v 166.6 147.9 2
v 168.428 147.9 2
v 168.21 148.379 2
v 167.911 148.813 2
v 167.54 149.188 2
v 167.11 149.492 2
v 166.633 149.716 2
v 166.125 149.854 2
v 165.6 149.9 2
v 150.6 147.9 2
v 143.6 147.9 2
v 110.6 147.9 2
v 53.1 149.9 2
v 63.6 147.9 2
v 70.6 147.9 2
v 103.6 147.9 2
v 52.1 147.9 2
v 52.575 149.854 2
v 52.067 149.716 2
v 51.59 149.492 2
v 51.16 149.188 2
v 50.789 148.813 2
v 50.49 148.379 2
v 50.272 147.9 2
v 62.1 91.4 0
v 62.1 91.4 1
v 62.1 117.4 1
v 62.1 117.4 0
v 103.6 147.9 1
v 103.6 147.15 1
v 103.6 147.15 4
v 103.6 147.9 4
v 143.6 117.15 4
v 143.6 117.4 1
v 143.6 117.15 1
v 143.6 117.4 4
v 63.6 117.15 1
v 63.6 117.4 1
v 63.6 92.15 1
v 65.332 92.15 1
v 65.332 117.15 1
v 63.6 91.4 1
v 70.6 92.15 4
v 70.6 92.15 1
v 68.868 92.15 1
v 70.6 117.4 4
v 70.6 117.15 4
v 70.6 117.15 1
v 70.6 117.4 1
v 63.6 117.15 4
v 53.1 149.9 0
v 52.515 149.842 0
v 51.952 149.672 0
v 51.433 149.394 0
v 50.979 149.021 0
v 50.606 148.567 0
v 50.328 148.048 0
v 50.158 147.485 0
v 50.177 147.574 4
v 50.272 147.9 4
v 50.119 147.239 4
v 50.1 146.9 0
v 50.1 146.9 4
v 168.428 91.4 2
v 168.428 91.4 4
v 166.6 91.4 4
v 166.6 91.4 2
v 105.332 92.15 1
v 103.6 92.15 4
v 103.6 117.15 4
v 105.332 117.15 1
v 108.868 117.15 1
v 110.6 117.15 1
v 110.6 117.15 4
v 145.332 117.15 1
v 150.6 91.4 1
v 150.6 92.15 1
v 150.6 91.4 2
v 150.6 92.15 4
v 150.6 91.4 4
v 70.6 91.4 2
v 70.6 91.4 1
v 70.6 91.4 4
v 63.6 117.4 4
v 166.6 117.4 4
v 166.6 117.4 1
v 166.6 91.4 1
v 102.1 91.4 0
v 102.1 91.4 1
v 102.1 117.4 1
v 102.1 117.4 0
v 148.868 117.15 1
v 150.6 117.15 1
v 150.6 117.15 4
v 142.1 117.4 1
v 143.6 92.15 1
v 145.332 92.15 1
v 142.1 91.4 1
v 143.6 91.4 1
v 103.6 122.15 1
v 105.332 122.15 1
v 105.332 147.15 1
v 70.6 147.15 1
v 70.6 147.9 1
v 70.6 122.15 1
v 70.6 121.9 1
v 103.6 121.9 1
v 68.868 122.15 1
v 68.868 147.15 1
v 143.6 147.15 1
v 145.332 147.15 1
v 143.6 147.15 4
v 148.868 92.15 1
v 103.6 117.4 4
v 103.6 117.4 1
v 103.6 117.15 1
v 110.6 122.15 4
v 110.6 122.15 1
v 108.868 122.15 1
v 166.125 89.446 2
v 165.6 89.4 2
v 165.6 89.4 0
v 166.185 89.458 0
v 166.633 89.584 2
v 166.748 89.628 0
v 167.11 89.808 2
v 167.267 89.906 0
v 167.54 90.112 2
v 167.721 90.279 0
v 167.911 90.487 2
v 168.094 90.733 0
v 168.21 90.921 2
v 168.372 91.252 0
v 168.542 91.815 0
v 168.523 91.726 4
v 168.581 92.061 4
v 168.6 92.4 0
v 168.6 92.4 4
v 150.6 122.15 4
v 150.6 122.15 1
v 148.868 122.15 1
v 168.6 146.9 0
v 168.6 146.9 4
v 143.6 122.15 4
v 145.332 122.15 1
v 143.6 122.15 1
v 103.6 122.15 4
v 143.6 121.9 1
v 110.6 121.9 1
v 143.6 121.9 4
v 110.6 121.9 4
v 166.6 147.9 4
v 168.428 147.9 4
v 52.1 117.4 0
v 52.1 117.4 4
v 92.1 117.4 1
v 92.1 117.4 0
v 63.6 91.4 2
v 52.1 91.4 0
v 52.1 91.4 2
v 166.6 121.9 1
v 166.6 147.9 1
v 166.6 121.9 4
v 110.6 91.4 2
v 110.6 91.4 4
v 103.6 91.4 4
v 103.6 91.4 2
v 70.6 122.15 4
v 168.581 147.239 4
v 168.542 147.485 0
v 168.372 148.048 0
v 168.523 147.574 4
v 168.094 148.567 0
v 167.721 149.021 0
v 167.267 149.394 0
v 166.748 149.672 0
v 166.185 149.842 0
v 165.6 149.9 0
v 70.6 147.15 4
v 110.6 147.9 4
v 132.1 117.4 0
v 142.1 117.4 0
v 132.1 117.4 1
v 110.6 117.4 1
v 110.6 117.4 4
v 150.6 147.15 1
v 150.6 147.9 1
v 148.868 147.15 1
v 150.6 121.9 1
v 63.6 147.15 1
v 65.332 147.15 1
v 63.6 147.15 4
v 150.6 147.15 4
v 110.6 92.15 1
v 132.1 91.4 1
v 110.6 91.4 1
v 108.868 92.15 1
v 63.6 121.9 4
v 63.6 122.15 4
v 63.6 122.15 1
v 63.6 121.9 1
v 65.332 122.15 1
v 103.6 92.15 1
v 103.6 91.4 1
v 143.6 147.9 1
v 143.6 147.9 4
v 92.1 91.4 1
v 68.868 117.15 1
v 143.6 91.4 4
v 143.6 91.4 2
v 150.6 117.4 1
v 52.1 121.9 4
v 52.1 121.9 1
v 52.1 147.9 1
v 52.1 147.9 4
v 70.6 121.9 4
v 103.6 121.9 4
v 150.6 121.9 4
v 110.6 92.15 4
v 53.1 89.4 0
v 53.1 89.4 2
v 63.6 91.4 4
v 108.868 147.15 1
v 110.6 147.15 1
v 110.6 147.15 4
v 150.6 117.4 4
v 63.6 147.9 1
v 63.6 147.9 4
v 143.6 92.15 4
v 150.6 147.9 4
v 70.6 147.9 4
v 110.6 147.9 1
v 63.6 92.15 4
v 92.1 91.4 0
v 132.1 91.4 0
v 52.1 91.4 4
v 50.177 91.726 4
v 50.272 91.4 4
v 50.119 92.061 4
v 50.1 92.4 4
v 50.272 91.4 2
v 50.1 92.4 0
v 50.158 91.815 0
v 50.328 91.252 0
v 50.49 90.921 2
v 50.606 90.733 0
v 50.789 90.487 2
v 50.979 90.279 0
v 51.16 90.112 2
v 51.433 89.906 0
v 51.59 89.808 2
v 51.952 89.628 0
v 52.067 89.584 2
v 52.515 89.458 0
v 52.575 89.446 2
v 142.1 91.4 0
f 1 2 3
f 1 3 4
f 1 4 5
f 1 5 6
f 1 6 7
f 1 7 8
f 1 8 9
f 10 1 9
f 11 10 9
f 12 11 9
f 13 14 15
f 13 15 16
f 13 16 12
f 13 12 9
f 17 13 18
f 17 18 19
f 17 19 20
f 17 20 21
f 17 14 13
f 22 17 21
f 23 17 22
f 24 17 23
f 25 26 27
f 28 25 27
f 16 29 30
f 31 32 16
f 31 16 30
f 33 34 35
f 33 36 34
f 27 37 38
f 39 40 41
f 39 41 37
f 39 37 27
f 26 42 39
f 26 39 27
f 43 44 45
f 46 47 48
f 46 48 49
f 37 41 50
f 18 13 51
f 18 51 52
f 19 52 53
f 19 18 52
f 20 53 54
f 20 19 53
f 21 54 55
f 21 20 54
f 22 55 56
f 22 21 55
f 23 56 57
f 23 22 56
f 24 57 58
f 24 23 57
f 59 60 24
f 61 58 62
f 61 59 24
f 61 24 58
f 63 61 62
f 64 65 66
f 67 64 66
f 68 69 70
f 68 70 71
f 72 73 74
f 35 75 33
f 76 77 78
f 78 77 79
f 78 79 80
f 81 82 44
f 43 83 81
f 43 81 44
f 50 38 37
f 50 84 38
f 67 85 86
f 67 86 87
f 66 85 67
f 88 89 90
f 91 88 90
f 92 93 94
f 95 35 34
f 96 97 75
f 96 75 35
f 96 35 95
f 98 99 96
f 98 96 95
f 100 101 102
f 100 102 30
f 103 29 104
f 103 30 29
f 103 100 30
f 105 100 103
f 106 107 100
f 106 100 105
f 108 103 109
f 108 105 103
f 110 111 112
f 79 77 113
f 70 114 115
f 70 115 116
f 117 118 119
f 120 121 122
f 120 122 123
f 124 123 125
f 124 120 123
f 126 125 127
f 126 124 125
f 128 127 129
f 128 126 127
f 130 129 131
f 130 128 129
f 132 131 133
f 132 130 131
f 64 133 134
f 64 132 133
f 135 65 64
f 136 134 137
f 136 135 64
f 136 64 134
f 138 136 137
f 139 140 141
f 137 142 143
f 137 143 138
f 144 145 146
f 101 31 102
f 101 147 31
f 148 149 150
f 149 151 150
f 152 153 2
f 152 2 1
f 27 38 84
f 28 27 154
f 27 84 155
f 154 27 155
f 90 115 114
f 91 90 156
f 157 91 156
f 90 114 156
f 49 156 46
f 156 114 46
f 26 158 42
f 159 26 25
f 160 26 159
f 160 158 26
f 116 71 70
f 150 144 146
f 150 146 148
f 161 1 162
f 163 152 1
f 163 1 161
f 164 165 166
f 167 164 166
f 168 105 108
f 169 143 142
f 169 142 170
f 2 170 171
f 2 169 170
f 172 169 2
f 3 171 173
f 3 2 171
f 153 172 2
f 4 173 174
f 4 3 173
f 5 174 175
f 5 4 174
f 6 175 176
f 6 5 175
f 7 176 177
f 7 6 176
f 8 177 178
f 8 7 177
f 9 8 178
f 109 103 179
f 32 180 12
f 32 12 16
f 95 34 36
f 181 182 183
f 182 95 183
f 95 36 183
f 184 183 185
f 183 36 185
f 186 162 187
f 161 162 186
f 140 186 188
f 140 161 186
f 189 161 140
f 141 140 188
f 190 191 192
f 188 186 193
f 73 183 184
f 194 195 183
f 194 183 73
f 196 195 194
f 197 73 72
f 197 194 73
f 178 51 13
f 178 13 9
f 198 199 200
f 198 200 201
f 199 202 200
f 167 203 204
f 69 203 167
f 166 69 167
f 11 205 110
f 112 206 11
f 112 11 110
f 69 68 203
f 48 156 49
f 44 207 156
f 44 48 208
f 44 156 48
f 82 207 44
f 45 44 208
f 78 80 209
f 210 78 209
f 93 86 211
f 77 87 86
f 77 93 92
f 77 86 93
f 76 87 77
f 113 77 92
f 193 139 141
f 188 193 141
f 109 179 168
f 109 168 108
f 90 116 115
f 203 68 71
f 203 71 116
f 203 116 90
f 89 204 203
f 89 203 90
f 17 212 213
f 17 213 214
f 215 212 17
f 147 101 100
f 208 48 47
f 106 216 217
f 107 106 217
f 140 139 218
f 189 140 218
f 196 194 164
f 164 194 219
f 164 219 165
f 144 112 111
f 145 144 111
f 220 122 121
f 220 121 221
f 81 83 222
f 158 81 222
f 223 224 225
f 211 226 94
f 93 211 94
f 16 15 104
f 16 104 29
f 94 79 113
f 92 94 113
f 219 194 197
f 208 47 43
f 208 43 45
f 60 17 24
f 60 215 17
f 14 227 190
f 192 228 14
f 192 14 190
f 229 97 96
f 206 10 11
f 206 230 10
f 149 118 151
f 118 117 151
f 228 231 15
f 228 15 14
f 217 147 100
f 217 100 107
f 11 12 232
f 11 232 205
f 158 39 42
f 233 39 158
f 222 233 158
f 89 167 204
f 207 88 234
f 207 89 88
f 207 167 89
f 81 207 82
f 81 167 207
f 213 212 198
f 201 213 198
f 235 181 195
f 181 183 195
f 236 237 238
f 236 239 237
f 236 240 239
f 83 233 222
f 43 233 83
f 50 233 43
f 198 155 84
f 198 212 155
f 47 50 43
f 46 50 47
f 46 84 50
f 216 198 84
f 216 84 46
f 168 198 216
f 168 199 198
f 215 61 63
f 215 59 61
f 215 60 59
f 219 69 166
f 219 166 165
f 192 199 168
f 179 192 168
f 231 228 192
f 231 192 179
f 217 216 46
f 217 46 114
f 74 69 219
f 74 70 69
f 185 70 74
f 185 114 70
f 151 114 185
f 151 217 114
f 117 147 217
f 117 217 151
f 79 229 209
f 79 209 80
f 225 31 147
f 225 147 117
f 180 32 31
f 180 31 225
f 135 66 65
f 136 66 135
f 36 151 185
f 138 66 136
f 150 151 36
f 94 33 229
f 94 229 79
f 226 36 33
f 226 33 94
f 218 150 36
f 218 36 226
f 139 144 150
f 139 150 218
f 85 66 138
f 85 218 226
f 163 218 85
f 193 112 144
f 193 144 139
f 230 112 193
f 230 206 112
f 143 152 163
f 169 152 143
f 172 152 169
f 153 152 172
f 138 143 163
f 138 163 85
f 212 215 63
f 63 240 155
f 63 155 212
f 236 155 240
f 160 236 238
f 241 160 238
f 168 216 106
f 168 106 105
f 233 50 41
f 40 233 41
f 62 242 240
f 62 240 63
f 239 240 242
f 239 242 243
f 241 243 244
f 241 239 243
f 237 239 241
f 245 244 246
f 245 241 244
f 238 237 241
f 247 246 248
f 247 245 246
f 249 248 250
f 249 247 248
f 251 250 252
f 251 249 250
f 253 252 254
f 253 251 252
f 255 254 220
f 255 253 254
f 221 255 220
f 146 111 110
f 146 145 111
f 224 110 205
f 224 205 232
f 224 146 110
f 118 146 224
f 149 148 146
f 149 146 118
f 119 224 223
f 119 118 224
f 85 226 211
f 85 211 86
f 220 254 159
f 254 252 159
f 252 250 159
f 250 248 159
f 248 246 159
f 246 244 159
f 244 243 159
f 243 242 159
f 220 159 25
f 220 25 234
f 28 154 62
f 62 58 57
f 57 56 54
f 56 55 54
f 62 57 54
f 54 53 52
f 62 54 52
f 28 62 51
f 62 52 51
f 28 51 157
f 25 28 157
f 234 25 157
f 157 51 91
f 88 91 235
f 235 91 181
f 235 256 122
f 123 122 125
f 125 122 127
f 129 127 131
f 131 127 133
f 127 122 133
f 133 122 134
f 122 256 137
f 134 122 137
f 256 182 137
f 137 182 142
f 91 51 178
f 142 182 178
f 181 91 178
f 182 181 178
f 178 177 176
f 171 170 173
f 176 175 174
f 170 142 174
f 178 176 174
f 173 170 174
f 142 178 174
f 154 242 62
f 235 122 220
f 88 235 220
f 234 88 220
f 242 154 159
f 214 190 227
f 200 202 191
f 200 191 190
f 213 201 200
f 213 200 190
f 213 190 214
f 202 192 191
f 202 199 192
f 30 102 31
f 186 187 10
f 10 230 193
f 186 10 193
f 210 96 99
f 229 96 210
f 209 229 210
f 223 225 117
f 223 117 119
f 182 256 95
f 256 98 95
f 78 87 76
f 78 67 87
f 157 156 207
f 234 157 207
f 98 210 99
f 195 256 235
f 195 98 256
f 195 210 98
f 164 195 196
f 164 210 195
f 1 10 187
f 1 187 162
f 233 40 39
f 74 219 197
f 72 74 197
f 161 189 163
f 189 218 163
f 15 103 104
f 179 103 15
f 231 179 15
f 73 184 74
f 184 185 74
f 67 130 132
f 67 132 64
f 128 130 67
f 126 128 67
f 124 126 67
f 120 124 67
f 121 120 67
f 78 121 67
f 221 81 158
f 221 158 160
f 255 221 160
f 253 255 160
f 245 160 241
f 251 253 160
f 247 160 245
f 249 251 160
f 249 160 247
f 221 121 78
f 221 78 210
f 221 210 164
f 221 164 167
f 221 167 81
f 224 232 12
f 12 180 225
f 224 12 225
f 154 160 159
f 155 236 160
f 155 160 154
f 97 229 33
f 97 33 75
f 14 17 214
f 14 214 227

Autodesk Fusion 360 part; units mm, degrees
sketch "Schizzo1" plane through (0, 0, 0) normal (0, 0, 1) x (1, 0, 0)
  line L0 (50, 150) -> (168.7, 150) construction
  line L1 (168.7, 150) -> (168.7, 89.3) construction
  line L2 (168.7, 89.3) -> (50, 89.3) construction
  line L3 (50, 89.3) -> (50, 150) construction
  line L4 (50, 119.65) -> (168.7, 119.65) construction
  line L5 (109.35, 150) -> (109.35, 89.3) construction
  line L6 (168.6, 89.4) -> (50.1, 89.4)
  line L7 (50.1, 89.4) -> (50.1, 149.9)
  line L8 (50.1, 149.9) -> (168.6, 149.9)
  line L9 (168.6, 149.9) -> (168.6, 89.4)
  line L10 (168.6, 89.4) -> (50.1, 149.9) construction
  line L11 (50.1, 89.4) -> (168.6, 149.9) construction
  point P0 (109.35, 119.65)
  dimension "d1" = 118.7
  dimension "d2" = 60.7
  dimension "d3" = 0.1
  dimension "d4" = 0.1
extrude "Estrusione1" add sketch "Schizzo1" along normal blind 4
fillet "Raccordo1" radius 3 4 edges at (50.1, 89.4, 2) (168.6, 89.4, 2) (50.1, 149.9, 2) (168.6, 149.9, 2)
sketch "Schizzo2" plane through (0, 0, 4) normal (0, 0, 1) x (-1, 0, 0)
  arc A0 (-168.6, -146.9) -> (-165.6, -149.9) centre (-165.6, -146.9) ccw
  line L0 (-165.6, -149.9) -> (-53.1, -149.9)
  arc A1 (-53.1, -149.9) -> (-50.1, -146.9) centre (-53.1, -146.9) ccw
  line L1 (-50.1, -146.9) -> (-50.1, -92.4)
  arc A2 (-50.1, -92.4) -> (-53.1, -89.4) centre (-53.1, -92.4) ccw
  line L2 (-53.1, -89.4) -> (-165.6, -89.4)
  arc A3 (-165.6, -89.4) -> (-168.6, -92.4) centre (-165.6, -92.4) ccw
  line L3 (-168.6, -92.4) -> (-168.6, -146.9)
  line L4 (-50.1, -149.9) -> (-168.6, -149.9) construction
  line L5 (-168.6, -149.9) -> (-168.6, -89.4) construction
  line L6 (-168.6, -89.4) -> (-50.1, -89.4) construction
  line L7 (-50.1, -89.4) -> (-50.1, -149.9) construction
  line L8 (-50.1, -119.65) -> (-168.6, -119.65) construction
  line L9 (-109.35, -149.9) -> (-109.35, -89.4) construction
  line L10 (-166.6, -91.4) -> (-52.1, -91.4)
  line L11 (-52.1, -91.4) -> (-52.1, -147.9)
  line L12 (-52.1, -147.9) -> (-166.6, -147.9)
  line L13 (-166.6, -147.9) -> (-166.6, -91.4)
  line L14 (-166.6, -91.4) -> (-52.1, -147.9) construction
  line L15 (-52.1, -91.4) -> (-166.6, -147.9) construction
  line L16 (-70.6, -91.4) -> (-70.6, -147.9)
  line L17 (-63.6, -147.9) -> (-63.6, -91.4)
  line L18 (-52.1, -121.9) -> (-52.1, -147.9)
  line L19 (-103.6, -147.9) -> (-103.6, -91.4)
  line L20 (-110.6, -147.9) -> (-110.6, -91.4)
  line L21 (-143.6, -147.9) -> (-143.6, -91.4)
  line L22 (-150.6, -147.9) -> (-150.6, -91.4)
  line L23 (-52.1, -91.4) -> (-62.1, -91.4)
  line L24 (-62.1, -91.4) -> (-62.1, -117.4)
  line L25 (-62.1, -117.4) -> (-52.1, -117.4)
  line L26 (-52.1, -117.4) -> (-52.1, -91.4)
  line L27 (-102.1, -117.4) -> (-92.1, -117.4)
  line L28 (-92.1, -117.4) -> (-92.1, -91.4)
  line L29 (-102.1, -91.4) -> (-102.1, -117.4)
  line L30 (-92.1, -91.4) -> (-102.1, -91.4)
  line L31 (-142.1, -117.4) -> (-132.1, -117.4)
  line L32 (-132.1, -117.4) -> (-132.1, -91.4)
  line L33 (-142.1, -91.4) -> (-142.1, -117.4)
  line L34 (-132.1, -91.4) -> (-142.1, -91.4)
  line L35 (-52.1, -117.4) -> (-166.6, -117.4)
  line L36 (-52.1, -121.9) -> (-166.6, -121.9)
  point P0 (-109.35, -119.65)
  point P1 (-109.35, -119.65)
  dimension "d11" = 7
  dimension "d20" = 7
  dimension "d25" = 7
  dimension "d36" = 13.5
  dimension "d37" = 53.5
  dimension "d38" = 93.5
  dimension "d39" = 10
  dimension "d40" = 26
  dimension "d41" = 2
  dimension "d42" = 2
  dimension "d45" = -40
  dimension "d46" = 0
extrude "Estrusione2" cut sketch "Schizzo2" against normal blind 3 contours L10 L13 L22 L35 | L10 L21 L33 L35 | L12 L13 L22 L36 | L10 L31 L32 L33 L34 L35 | L10 L20 L32 L35 | L12 L20 L21 L36 | L10 L19 L29 L35 | L12 L16 L19 L36 | L10 L27 L28 L29 L30 L35 | L10 L16 L28 L35 | L11 L12 L17 L18 L36 | L10 L17 L24 L35 | L10 L11 L23 L24 L25 L26 L35
extrude "Estrusione3" cut sketch "Schizzo2" against normal blind 4 contours L10 L31 L32 L33 L34 L35 | L10 L27 L28 L29 L30 L35 | L10 L11 L23 L24 L25 L26 L35
ref_plane "Piano di lavoro1" through (109.35, 119.65, 4) normal (0, -1, 0) x (1, 0, 0)
sketch "Schizzo3" plane through (0, 119.65, 0) normal (0, -1, 0) x (-1, 0, 0)
  line L0 (-50.1, -4) -> (-168.7, -4) construction
  line L1 (-168.7, -4) -> (-168.7, 0) construction
  line L2 (-168.7, 0) -> (-50.1, 0) construction
  line L3 (-50.1, 0) -> (-50.1, -4) construction
  line L4 (-168.6, -4) -> (-50.1, -4) construction
  line L5 (-50.1, -1) -> (-168.7, -1) construction
  line L6 (-63.6, -4) -> (-63.6, 0) construction
  line L7 (-70.6, -4) -> (-70.6, 0) construction
  line L8 (-63.6, -4) -> (-63.6, -1) construction
  line L9 (-70.6, -4) -> (-70.6, -1) construction
  line L10 (-103.6, -4) -> (-103.6, 0) construction
  line L11 (-110.6, -4) -> (-110.6, 0) construction
  line L12 (-103.6, -4) -> (-103.6, -1) construction
  line L13 (-110.6, -4) -> (-110.6, -1) construction
  line L14 (-143.6, -4) -> (-143.6, 0) construction
  line L15 (-150.6, -4) -> (-150.6, 0) construction
  line L16 (-143.6, -4) -> (-143.6, -1) construction
  line L17 (-150.6, -4) -> (-150.6, -1) construction
  line L18 (-63.6, -4) -> (-65.3321, -1)
  line L19 (-63.6, -4) -> (-60.1359, -4) construction
  line L20 (-70.6, -4) -> (-68.8679, -1)
  line L21 (-70.6, -4) -> (-67.1359, -4) construction
  line L22 (-63.6, -4) -> (-63.6, -1)
  line L23 (-63.6, -1) -> (-65.3321, -1)
  line L24 (-68.8679, -1) -> (-70.6, -1)
  line L25 (-70.6, -1) -> (-70.6, -4)
  line L26 (-103.6, -1) -> (-103.6, -4)
  line L27 (-103.6, -4) -> (-105.3321, -1)
  line L28 (-105.3321, -1) -> (-103.6, -1)
  line L29 (-110.6, -1) -> (-110.6, -4)
  line L30 (-110.6, -4) -> (-108.8679, -1)
  line L31 (-108.8679, -1) -> (-110.6, -1)
  line L32 (-143.6, -1) -> (-143.6, -4)
  line L33 (-143.6, -4) -> (-145.3321, -1)
  line L34 (-145.3321, -1) -> (-143.6, -1)
  line L35 (-150.6, -1) -> (-150.6, -4)
  line L36 (-150.6, -4) -> (-148.8679, -1)
  line L37 (-148.8679, -1) -> (-150.6, -1)
  line L38 (-110.6, -1) -> (-143.6, -1)
  point P0 (-168.7, 0)
  dimension "d28" = 120
  dimension "d29" = 60
  dimension "d30" = 30
  dimension "d31" = 30
  dimension "d32" = 30
  dimension "d33" = 30
extrude "Estrusione4" cut sketch "Schizzo3" along normal blind 25 from surface at 2.5
extrude "Estrusione6" cut sketch "Schizzo3" against normal blind 25 from surface at -2.5
sketch "Schizzo4" plane through (0, 0, 4) normal (0, 0, 1) x (-1, 0, 0)
  line L0 (-50.1, -149.9) -> (-168.6, -149.9) construction
  line L1 (-168.6, -149.9) -> (-168.6, -89.4) construction
  line L2 (-168.6, -89.4) -> (-50.1, -89.4) construction
  line L3 (-50.1, -89.4) -> (-50.1, -149.9) construction
  line L4 (-165.6, -149.9) -> (-53.1, -149.9) construction
  line L5 (-53.1, -89.4) -> (-165.6, -89.4) construction
  line L6 (-50.1, -146.9) -> (-50.1, -92.4) construction
  line L7 (-168.6, -92.4) -> (-168.6, -146.9) construction
  line L8 (-50.1, -149.9) -> (-168.6, -149.9)
  line L9 (-168.6, -149.9) -> (-168.6, -147.9)
  line L10 (-168.6, -147.9) -> (-50.1, -147.9)
  line L11 (-50.1, -147.9) -> (-50.1, -149.9)
  line L12 (-50.1, -89.4) -> (-168.6, -89.4)
  line L13 (-168.6, -89.4) -> (-168.6, -91.4)
  line L14 (-168.6, -91.4) -> (-50.1, -91.4)
  line L15 (-50.1, -91.4) -> (-50.1, -89.4)
  dimension "d51" = 2
  dimension "d52" = 2
extrude "Estrusione5" cut sketch "Schizzo4" against normal blind 2
equation "d28 = 90 deg + 30 deg"
equation "d52 = d51"
